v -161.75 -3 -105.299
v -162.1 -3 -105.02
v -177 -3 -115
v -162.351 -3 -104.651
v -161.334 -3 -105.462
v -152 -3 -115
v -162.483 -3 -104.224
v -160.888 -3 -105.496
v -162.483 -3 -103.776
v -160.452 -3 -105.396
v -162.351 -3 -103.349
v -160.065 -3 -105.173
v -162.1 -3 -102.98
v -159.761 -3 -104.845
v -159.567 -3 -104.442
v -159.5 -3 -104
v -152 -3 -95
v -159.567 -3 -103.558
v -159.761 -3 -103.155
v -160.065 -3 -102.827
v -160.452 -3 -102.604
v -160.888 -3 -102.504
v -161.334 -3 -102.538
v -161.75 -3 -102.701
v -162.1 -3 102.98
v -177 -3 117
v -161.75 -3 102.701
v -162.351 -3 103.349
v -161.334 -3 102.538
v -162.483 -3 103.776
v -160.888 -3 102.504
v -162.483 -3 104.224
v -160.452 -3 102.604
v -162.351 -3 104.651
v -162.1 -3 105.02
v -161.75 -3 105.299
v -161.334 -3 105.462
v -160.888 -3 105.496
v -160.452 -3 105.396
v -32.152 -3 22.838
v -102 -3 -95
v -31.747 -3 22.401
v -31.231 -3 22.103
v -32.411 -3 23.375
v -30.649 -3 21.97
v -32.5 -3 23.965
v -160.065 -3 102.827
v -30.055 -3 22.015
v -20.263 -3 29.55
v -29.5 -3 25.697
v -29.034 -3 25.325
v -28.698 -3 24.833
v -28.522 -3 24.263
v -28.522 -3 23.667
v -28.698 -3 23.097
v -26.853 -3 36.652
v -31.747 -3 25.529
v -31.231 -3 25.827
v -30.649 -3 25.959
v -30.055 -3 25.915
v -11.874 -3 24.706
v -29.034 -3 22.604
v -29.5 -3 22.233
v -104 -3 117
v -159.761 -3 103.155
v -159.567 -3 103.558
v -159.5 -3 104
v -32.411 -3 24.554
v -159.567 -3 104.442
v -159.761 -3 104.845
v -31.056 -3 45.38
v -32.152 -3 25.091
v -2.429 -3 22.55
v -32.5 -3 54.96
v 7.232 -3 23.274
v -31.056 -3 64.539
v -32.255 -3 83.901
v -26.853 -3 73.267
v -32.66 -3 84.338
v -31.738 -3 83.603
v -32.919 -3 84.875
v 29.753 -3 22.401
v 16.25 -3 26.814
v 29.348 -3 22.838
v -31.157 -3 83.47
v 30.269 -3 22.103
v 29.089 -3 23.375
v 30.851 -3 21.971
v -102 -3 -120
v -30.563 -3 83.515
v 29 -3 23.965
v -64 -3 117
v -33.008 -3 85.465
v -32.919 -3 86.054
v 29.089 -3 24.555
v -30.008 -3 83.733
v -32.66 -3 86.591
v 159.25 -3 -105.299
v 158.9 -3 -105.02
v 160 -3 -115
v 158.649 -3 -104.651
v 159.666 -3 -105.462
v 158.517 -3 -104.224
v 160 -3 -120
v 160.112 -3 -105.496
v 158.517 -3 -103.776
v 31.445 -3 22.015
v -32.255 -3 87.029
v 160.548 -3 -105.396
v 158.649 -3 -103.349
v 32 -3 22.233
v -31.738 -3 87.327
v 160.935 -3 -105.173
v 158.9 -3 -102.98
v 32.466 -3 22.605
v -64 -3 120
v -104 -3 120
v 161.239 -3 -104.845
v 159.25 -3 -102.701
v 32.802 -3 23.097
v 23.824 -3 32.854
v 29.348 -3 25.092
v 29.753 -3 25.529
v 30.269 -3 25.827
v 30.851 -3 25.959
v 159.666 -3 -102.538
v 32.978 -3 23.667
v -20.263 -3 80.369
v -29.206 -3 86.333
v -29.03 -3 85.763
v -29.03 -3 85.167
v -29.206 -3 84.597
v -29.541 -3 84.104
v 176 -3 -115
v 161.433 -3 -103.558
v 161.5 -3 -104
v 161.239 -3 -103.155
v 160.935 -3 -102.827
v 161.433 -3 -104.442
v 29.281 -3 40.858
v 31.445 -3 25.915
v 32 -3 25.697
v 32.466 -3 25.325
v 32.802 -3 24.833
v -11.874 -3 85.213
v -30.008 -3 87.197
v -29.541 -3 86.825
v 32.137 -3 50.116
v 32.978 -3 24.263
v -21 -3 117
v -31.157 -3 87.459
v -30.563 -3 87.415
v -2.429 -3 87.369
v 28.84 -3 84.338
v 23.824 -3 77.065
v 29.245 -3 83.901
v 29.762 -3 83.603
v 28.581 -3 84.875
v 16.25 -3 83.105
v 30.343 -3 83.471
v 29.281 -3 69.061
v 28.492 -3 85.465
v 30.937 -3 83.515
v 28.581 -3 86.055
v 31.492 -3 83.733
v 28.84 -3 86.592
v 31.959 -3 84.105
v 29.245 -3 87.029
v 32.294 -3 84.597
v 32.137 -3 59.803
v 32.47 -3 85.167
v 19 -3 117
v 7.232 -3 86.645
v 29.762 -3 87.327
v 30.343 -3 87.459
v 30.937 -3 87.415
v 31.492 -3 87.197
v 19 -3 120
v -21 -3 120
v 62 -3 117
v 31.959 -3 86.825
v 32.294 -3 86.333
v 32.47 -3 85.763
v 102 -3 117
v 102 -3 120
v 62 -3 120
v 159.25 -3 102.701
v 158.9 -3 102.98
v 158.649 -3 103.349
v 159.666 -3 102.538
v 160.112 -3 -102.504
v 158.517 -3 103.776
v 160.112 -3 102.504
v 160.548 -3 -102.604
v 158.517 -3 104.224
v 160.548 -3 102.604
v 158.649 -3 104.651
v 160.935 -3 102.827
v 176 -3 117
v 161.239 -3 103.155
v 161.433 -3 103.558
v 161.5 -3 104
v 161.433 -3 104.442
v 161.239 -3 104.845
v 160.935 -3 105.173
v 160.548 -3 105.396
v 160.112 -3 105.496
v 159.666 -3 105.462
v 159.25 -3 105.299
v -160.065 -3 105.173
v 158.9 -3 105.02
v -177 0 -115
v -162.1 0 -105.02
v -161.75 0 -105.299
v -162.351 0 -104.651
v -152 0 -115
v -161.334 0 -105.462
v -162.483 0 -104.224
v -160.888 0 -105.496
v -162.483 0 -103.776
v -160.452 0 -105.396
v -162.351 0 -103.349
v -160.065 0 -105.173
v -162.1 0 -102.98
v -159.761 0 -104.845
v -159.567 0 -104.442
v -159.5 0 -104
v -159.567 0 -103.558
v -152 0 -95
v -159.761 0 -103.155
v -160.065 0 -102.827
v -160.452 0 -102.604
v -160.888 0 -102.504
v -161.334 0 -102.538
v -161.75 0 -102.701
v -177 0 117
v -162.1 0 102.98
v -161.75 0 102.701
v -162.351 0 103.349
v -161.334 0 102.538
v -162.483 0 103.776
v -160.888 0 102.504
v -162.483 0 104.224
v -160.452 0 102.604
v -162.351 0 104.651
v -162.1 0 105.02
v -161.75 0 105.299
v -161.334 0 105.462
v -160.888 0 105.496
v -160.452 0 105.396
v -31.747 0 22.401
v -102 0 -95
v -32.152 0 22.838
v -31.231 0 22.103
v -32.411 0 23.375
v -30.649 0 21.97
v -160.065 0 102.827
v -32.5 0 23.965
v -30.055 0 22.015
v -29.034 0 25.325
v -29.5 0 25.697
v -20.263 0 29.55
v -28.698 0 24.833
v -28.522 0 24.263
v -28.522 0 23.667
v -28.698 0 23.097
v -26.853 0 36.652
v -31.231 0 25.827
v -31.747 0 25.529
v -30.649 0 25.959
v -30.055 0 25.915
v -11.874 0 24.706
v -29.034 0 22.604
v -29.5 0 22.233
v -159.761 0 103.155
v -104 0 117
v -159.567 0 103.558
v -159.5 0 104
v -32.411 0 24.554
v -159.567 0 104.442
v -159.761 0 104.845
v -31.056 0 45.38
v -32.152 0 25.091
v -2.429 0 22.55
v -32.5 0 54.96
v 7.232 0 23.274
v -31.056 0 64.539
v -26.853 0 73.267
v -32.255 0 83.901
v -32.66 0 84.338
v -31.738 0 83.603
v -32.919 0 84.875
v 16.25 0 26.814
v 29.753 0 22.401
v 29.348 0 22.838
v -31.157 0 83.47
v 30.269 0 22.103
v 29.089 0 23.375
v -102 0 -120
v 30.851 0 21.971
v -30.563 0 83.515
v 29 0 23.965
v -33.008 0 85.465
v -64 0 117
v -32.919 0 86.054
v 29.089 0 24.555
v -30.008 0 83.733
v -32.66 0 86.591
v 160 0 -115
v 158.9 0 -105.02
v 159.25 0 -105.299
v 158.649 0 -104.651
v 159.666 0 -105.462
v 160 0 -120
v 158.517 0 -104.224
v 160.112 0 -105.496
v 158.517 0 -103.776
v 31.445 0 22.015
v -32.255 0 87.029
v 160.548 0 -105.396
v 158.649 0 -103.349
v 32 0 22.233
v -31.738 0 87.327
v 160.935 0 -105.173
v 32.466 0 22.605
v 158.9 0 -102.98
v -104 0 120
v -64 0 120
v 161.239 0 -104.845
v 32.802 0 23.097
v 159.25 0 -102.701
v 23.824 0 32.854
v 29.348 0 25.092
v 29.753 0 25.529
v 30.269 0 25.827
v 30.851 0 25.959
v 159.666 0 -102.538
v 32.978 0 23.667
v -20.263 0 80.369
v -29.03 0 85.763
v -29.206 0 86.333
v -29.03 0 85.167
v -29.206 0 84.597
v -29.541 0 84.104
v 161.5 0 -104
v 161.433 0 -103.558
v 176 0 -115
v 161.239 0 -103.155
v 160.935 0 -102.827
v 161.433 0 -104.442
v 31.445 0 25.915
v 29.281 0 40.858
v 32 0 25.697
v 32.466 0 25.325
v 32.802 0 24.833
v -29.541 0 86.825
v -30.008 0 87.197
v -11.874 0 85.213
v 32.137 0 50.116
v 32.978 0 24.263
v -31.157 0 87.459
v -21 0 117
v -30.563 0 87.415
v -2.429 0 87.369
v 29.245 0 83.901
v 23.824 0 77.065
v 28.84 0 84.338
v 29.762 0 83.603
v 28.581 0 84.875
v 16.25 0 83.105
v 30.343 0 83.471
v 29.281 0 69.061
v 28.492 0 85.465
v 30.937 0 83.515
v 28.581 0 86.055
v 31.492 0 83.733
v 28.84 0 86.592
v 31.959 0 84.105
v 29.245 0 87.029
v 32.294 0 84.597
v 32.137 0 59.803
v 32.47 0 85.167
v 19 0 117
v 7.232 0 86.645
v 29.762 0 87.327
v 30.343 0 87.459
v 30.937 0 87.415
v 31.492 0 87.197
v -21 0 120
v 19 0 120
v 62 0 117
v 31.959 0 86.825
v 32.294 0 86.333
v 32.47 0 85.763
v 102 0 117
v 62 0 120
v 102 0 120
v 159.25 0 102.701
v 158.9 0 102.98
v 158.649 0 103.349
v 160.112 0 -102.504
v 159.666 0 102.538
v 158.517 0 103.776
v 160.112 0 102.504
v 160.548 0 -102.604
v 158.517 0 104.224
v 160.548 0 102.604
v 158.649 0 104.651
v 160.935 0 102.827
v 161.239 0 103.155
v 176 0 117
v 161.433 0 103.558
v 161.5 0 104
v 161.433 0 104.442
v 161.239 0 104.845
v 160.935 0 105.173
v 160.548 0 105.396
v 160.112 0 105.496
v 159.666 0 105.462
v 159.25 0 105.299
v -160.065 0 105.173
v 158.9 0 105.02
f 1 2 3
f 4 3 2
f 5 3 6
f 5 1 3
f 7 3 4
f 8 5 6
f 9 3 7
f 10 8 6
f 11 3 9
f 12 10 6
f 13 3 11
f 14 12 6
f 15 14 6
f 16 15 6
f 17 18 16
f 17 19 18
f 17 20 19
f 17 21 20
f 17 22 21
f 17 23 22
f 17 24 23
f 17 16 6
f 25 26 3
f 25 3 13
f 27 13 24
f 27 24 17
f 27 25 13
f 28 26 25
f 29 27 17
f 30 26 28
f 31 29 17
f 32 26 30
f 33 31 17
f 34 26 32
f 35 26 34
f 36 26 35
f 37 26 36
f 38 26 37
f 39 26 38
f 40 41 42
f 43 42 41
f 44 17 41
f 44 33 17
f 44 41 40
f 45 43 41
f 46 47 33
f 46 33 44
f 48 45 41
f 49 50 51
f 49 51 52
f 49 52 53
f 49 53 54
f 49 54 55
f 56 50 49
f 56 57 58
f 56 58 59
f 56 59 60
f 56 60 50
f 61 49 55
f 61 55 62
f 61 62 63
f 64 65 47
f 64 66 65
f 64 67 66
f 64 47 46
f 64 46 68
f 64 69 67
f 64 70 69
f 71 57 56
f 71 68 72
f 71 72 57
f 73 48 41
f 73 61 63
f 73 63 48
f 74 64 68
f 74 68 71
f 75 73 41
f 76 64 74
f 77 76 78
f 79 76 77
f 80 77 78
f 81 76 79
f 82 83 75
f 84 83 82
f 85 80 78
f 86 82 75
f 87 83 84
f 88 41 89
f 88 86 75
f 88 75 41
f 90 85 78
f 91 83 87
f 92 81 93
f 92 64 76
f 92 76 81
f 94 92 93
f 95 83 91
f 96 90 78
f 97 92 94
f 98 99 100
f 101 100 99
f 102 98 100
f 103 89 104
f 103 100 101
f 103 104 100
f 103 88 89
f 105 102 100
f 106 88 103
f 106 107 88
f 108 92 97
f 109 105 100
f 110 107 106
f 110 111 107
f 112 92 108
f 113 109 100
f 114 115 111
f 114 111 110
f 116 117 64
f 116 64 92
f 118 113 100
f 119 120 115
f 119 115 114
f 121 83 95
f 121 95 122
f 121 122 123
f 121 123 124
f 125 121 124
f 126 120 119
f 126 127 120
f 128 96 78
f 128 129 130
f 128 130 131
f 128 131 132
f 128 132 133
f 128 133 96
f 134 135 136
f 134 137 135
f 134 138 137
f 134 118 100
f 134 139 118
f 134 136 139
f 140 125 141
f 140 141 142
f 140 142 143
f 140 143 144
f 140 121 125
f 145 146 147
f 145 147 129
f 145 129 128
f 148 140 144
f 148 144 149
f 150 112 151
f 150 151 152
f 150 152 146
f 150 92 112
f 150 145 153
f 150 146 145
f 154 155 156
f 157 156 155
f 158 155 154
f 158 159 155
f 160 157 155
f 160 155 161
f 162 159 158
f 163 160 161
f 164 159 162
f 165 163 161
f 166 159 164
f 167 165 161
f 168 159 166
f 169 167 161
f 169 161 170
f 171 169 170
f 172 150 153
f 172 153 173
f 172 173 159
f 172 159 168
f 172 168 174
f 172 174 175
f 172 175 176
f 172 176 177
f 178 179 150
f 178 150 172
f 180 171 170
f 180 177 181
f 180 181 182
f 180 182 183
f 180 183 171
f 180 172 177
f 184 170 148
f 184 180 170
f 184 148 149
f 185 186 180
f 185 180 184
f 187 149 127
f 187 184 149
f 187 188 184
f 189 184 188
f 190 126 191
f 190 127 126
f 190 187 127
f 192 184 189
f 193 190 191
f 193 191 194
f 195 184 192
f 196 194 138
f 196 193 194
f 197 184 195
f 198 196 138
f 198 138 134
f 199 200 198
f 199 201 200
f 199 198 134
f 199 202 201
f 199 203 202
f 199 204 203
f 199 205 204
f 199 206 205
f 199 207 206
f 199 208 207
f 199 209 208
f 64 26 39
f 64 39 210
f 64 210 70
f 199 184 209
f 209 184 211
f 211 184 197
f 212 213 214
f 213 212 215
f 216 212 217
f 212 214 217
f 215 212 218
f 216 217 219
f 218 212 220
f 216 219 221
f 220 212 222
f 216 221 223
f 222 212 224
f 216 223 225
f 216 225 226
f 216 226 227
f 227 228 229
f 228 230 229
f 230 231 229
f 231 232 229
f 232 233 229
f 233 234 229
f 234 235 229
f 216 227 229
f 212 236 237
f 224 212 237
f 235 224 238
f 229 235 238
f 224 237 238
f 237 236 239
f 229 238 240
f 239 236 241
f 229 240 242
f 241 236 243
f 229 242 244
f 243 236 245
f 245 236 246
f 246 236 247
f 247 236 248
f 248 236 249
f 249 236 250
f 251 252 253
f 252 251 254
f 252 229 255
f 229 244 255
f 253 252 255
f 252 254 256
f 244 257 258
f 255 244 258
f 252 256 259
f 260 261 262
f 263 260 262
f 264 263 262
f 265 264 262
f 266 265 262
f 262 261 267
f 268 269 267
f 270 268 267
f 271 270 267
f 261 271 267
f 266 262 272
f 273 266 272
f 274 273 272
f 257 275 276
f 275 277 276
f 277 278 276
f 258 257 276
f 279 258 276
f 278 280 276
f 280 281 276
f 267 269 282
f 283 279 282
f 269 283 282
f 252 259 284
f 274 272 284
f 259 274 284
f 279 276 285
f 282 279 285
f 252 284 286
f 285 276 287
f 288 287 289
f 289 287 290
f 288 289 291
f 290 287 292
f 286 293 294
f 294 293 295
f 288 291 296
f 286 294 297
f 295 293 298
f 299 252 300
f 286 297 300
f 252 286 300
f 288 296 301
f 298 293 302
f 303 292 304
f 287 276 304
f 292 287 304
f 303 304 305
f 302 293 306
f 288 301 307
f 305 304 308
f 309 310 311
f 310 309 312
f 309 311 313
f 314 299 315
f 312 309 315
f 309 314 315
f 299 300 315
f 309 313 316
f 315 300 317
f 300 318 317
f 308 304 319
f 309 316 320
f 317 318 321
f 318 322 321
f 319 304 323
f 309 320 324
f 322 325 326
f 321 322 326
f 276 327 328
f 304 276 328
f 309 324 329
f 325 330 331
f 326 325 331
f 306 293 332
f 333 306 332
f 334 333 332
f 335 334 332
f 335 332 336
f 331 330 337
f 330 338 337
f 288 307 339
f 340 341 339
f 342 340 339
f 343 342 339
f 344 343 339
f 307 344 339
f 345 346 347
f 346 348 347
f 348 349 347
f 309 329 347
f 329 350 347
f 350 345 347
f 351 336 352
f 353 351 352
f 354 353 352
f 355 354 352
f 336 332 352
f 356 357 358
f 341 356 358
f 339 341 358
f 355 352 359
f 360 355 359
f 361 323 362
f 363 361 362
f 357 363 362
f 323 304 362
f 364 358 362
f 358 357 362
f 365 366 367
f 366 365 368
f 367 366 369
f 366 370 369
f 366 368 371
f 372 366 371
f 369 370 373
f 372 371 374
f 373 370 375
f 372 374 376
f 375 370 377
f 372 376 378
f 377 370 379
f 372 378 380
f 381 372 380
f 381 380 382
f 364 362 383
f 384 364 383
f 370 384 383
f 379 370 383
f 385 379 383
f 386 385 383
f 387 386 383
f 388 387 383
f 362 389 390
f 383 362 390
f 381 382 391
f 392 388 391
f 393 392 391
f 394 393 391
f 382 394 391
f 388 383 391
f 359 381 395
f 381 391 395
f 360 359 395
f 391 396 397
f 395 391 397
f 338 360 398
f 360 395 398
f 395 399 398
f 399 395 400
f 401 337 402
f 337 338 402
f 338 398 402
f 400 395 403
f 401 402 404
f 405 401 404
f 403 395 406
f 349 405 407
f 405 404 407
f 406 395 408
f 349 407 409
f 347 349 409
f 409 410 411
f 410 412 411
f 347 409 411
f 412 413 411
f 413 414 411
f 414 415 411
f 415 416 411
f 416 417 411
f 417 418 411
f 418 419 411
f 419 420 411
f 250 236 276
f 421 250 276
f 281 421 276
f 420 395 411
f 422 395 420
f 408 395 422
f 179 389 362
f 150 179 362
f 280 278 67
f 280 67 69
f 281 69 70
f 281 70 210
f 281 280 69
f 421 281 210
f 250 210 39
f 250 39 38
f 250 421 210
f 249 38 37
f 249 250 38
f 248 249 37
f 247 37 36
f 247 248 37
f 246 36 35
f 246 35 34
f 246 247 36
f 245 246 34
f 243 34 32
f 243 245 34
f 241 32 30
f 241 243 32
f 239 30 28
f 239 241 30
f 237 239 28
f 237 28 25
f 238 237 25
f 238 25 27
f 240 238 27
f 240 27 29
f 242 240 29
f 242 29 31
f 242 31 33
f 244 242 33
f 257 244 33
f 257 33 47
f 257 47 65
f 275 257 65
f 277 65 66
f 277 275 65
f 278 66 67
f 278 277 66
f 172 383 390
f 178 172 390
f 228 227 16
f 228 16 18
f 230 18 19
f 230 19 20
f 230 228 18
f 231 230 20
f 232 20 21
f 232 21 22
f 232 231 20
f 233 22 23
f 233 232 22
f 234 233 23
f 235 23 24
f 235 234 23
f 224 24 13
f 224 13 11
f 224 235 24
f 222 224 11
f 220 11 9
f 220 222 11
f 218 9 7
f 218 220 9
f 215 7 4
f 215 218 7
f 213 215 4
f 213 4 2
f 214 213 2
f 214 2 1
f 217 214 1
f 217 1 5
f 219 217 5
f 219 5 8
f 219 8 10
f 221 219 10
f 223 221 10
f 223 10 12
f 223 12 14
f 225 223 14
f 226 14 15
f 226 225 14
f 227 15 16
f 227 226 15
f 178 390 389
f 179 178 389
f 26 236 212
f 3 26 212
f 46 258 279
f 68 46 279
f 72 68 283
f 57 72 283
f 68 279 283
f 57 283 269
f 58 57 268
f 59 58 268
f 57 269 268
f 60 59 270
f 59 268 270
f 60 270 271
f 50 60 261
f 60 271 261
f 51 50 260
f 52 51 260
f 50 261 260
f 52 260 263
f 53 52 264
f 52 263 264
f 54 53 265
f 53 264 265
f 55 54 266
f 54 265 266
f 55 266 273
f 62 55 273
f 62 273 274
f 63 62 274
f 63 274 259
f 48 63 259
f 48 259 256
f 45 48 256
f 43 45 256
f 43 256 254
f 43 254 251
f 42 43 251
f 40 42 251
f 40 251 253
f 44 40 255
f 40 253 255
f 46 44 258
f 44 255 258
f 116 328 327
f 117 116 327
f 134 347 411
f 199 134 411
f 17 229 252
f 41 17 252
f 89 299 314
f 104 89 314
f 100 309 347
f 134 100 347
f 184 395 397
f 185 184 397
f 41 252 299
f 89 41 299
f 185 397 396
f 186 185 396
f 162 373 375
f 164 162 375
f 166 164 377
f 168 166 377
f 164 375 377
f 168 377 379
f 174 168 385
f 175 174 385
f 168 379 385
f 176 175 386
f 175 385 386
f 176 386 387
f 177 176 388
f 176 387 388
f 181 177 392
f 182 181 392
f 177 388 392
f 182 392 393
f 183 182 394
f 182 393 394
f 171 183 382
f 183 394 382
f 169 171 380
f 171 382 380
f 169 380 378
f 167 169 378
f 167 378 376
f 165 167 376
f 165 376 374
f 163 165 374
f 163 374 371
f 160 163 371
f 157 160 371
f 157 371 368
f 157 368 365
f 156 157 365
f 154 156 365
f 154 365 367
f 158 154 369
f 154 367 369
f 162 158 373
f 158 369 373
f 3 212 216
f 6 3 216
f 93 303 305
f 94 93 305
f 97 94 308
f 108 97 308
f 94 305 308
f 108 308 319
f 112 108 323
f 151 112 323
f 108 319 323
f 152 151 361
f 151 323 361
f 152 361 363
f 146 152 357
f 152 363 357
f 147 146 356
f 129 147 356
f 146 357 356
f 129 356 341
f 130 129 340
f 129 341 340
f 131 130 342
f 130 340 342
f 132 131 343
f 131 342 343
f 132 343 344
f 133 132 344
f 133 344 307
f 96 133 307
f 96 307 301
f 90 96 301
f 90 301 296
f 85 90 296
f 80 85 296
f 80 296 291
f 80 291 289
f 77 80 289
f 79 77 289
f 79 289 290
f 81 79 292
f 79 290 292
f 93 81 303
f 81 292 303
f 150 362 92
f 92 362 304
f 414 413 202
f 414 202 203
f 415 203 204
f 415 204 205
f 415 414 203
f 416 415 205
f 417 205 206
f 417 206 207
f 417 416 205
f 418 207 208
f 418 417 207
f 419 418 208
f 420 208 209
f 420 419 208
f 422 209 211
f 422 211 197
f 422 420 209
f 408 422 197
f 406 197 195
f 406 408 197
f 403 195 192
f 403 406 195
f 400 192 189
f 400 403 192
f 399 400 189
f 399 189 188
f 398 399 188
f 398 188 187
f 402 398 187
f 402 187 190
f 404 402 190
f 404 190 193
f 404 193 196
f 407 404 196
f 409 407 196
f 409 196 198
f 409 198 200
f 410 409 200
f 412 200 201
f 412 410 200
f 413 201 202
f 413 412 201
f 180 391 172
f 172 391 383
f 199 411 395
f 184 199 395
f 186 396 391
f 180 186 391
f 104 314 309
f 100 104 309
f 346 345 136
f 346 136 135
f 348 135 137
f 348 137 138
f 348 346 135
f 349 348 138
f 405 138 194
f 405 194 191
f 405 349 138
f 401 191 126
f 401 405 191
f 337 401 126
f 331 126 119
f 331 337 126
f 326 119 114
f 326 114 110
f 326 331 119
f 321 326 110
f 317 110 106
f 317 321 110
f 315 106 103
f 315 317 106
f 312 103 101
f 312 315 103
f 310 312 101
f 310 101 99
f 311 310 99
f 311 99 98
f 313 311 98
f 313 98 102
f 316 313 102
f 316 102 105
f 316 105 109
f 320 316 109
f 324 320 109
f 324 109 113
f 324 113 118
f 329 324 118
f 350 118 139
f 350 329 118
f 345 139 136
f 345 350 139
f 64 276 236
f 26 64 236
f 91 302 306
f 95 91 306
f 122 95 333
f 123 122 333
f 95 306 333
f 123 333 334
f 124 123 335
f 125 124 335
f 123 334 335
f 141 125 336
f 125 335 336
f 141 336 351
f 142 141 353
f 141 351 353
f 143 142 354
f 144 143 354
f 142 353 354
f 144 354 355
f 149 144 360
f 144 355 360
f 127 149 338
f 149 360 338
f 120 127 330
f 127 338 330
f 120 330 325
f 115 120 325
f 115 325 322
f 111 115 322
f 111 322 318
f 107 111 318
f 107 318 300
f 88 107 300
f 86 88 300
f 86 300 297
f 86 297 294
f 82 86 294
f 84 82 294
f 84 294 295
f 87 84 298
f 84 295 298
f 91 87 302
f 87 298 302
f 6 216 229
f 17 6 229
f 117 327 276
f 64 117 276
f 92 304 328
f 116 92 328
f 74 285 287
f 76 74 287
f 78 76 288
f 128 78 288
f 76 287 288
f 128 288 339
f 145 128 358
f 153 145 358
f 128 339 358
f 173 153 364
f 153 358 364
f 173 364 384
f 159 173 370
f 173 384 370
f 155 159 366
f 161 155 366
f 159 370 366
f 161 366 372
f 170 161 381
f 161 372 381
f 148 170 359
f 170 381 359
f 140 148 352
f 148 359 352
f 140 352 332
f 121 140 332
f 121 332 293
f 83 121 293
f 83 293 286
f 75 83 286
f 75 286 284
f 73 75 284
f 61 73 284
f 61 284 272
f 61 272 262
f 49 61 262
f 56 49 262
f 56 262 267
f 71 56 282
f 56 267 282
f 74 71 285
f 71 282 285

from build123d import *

# Parameters (mm, degrees)
F0_R     = 1.5
F1_DEPTH = 3
F2_R     = 32.5
F3_DEPTH = 3
F5_R     = 2
F6_DEPTH = 3


with BuildPart() as f1:
    # F0 (on Front) → F1 (new body)
    with BuildSketch(Plane.XZ):
        Polygon((102, 117), (102, 120), (62, 120), (62, 117), (19, 117), (19, 120), (-21, 120), (-21, 117), (-64, 117), (-64, 120), (-104, 120), (-104, 117), (-177, 117), (-177, -115), (-152, -115), (-152, -95), (-102, -95), (-102, -120), (160, -120), (160, -115), (176, -115), (176, 117), align=None)
        with Locations((-161, -104)):
            Circle(F0_R, mode=Mode.SUBTRACT)
        with Locations((160, -104)):
            Circle(F0_R, mode=Mode.SUBTRACT)
        with Locations((-161, 104)):
            Circle(F0_R, mode=Mode.SUBTRACT)
        with Locations((160, 104)):
            Circle(F0_R, mode=Mode.SUBTRACT)
    extrude(amount=F1_DEPTH)

    # F2 (on face) → F3 (cut)
    with BuildSketch(Plane(origin=(0, 0, 0), x_dir=(-1, 0, 0), z_dir=(0, 1, 0))):
        with Locations((0, 54.959509)):
            Circle(F2_R)
    extrude(amount=-F3_DEPTH, mode=Mode.SUBTRACT)

    # F5 (on face) → F6 (cut)
    with BuildSketch(Plane(origin=(0, 0, 0), x_dir=(-1, 0, 0), z_dir=(0, 1, 0))):
        with Locations((-30.492457, 85.465)):
            Circle(F5_R)
        with Locations((31.007543, 85.464843)):
            Circle(F5_R)
        with Locations((30.500002, 23.964843)):
            Circle(F5_R)
        with Locations((-30.999998, 23.965)):
            Circle(F5_R)
    extrude(amount=-F6_DEPTH, mode=Mode.SUBTRACT)


solid = f1.part
